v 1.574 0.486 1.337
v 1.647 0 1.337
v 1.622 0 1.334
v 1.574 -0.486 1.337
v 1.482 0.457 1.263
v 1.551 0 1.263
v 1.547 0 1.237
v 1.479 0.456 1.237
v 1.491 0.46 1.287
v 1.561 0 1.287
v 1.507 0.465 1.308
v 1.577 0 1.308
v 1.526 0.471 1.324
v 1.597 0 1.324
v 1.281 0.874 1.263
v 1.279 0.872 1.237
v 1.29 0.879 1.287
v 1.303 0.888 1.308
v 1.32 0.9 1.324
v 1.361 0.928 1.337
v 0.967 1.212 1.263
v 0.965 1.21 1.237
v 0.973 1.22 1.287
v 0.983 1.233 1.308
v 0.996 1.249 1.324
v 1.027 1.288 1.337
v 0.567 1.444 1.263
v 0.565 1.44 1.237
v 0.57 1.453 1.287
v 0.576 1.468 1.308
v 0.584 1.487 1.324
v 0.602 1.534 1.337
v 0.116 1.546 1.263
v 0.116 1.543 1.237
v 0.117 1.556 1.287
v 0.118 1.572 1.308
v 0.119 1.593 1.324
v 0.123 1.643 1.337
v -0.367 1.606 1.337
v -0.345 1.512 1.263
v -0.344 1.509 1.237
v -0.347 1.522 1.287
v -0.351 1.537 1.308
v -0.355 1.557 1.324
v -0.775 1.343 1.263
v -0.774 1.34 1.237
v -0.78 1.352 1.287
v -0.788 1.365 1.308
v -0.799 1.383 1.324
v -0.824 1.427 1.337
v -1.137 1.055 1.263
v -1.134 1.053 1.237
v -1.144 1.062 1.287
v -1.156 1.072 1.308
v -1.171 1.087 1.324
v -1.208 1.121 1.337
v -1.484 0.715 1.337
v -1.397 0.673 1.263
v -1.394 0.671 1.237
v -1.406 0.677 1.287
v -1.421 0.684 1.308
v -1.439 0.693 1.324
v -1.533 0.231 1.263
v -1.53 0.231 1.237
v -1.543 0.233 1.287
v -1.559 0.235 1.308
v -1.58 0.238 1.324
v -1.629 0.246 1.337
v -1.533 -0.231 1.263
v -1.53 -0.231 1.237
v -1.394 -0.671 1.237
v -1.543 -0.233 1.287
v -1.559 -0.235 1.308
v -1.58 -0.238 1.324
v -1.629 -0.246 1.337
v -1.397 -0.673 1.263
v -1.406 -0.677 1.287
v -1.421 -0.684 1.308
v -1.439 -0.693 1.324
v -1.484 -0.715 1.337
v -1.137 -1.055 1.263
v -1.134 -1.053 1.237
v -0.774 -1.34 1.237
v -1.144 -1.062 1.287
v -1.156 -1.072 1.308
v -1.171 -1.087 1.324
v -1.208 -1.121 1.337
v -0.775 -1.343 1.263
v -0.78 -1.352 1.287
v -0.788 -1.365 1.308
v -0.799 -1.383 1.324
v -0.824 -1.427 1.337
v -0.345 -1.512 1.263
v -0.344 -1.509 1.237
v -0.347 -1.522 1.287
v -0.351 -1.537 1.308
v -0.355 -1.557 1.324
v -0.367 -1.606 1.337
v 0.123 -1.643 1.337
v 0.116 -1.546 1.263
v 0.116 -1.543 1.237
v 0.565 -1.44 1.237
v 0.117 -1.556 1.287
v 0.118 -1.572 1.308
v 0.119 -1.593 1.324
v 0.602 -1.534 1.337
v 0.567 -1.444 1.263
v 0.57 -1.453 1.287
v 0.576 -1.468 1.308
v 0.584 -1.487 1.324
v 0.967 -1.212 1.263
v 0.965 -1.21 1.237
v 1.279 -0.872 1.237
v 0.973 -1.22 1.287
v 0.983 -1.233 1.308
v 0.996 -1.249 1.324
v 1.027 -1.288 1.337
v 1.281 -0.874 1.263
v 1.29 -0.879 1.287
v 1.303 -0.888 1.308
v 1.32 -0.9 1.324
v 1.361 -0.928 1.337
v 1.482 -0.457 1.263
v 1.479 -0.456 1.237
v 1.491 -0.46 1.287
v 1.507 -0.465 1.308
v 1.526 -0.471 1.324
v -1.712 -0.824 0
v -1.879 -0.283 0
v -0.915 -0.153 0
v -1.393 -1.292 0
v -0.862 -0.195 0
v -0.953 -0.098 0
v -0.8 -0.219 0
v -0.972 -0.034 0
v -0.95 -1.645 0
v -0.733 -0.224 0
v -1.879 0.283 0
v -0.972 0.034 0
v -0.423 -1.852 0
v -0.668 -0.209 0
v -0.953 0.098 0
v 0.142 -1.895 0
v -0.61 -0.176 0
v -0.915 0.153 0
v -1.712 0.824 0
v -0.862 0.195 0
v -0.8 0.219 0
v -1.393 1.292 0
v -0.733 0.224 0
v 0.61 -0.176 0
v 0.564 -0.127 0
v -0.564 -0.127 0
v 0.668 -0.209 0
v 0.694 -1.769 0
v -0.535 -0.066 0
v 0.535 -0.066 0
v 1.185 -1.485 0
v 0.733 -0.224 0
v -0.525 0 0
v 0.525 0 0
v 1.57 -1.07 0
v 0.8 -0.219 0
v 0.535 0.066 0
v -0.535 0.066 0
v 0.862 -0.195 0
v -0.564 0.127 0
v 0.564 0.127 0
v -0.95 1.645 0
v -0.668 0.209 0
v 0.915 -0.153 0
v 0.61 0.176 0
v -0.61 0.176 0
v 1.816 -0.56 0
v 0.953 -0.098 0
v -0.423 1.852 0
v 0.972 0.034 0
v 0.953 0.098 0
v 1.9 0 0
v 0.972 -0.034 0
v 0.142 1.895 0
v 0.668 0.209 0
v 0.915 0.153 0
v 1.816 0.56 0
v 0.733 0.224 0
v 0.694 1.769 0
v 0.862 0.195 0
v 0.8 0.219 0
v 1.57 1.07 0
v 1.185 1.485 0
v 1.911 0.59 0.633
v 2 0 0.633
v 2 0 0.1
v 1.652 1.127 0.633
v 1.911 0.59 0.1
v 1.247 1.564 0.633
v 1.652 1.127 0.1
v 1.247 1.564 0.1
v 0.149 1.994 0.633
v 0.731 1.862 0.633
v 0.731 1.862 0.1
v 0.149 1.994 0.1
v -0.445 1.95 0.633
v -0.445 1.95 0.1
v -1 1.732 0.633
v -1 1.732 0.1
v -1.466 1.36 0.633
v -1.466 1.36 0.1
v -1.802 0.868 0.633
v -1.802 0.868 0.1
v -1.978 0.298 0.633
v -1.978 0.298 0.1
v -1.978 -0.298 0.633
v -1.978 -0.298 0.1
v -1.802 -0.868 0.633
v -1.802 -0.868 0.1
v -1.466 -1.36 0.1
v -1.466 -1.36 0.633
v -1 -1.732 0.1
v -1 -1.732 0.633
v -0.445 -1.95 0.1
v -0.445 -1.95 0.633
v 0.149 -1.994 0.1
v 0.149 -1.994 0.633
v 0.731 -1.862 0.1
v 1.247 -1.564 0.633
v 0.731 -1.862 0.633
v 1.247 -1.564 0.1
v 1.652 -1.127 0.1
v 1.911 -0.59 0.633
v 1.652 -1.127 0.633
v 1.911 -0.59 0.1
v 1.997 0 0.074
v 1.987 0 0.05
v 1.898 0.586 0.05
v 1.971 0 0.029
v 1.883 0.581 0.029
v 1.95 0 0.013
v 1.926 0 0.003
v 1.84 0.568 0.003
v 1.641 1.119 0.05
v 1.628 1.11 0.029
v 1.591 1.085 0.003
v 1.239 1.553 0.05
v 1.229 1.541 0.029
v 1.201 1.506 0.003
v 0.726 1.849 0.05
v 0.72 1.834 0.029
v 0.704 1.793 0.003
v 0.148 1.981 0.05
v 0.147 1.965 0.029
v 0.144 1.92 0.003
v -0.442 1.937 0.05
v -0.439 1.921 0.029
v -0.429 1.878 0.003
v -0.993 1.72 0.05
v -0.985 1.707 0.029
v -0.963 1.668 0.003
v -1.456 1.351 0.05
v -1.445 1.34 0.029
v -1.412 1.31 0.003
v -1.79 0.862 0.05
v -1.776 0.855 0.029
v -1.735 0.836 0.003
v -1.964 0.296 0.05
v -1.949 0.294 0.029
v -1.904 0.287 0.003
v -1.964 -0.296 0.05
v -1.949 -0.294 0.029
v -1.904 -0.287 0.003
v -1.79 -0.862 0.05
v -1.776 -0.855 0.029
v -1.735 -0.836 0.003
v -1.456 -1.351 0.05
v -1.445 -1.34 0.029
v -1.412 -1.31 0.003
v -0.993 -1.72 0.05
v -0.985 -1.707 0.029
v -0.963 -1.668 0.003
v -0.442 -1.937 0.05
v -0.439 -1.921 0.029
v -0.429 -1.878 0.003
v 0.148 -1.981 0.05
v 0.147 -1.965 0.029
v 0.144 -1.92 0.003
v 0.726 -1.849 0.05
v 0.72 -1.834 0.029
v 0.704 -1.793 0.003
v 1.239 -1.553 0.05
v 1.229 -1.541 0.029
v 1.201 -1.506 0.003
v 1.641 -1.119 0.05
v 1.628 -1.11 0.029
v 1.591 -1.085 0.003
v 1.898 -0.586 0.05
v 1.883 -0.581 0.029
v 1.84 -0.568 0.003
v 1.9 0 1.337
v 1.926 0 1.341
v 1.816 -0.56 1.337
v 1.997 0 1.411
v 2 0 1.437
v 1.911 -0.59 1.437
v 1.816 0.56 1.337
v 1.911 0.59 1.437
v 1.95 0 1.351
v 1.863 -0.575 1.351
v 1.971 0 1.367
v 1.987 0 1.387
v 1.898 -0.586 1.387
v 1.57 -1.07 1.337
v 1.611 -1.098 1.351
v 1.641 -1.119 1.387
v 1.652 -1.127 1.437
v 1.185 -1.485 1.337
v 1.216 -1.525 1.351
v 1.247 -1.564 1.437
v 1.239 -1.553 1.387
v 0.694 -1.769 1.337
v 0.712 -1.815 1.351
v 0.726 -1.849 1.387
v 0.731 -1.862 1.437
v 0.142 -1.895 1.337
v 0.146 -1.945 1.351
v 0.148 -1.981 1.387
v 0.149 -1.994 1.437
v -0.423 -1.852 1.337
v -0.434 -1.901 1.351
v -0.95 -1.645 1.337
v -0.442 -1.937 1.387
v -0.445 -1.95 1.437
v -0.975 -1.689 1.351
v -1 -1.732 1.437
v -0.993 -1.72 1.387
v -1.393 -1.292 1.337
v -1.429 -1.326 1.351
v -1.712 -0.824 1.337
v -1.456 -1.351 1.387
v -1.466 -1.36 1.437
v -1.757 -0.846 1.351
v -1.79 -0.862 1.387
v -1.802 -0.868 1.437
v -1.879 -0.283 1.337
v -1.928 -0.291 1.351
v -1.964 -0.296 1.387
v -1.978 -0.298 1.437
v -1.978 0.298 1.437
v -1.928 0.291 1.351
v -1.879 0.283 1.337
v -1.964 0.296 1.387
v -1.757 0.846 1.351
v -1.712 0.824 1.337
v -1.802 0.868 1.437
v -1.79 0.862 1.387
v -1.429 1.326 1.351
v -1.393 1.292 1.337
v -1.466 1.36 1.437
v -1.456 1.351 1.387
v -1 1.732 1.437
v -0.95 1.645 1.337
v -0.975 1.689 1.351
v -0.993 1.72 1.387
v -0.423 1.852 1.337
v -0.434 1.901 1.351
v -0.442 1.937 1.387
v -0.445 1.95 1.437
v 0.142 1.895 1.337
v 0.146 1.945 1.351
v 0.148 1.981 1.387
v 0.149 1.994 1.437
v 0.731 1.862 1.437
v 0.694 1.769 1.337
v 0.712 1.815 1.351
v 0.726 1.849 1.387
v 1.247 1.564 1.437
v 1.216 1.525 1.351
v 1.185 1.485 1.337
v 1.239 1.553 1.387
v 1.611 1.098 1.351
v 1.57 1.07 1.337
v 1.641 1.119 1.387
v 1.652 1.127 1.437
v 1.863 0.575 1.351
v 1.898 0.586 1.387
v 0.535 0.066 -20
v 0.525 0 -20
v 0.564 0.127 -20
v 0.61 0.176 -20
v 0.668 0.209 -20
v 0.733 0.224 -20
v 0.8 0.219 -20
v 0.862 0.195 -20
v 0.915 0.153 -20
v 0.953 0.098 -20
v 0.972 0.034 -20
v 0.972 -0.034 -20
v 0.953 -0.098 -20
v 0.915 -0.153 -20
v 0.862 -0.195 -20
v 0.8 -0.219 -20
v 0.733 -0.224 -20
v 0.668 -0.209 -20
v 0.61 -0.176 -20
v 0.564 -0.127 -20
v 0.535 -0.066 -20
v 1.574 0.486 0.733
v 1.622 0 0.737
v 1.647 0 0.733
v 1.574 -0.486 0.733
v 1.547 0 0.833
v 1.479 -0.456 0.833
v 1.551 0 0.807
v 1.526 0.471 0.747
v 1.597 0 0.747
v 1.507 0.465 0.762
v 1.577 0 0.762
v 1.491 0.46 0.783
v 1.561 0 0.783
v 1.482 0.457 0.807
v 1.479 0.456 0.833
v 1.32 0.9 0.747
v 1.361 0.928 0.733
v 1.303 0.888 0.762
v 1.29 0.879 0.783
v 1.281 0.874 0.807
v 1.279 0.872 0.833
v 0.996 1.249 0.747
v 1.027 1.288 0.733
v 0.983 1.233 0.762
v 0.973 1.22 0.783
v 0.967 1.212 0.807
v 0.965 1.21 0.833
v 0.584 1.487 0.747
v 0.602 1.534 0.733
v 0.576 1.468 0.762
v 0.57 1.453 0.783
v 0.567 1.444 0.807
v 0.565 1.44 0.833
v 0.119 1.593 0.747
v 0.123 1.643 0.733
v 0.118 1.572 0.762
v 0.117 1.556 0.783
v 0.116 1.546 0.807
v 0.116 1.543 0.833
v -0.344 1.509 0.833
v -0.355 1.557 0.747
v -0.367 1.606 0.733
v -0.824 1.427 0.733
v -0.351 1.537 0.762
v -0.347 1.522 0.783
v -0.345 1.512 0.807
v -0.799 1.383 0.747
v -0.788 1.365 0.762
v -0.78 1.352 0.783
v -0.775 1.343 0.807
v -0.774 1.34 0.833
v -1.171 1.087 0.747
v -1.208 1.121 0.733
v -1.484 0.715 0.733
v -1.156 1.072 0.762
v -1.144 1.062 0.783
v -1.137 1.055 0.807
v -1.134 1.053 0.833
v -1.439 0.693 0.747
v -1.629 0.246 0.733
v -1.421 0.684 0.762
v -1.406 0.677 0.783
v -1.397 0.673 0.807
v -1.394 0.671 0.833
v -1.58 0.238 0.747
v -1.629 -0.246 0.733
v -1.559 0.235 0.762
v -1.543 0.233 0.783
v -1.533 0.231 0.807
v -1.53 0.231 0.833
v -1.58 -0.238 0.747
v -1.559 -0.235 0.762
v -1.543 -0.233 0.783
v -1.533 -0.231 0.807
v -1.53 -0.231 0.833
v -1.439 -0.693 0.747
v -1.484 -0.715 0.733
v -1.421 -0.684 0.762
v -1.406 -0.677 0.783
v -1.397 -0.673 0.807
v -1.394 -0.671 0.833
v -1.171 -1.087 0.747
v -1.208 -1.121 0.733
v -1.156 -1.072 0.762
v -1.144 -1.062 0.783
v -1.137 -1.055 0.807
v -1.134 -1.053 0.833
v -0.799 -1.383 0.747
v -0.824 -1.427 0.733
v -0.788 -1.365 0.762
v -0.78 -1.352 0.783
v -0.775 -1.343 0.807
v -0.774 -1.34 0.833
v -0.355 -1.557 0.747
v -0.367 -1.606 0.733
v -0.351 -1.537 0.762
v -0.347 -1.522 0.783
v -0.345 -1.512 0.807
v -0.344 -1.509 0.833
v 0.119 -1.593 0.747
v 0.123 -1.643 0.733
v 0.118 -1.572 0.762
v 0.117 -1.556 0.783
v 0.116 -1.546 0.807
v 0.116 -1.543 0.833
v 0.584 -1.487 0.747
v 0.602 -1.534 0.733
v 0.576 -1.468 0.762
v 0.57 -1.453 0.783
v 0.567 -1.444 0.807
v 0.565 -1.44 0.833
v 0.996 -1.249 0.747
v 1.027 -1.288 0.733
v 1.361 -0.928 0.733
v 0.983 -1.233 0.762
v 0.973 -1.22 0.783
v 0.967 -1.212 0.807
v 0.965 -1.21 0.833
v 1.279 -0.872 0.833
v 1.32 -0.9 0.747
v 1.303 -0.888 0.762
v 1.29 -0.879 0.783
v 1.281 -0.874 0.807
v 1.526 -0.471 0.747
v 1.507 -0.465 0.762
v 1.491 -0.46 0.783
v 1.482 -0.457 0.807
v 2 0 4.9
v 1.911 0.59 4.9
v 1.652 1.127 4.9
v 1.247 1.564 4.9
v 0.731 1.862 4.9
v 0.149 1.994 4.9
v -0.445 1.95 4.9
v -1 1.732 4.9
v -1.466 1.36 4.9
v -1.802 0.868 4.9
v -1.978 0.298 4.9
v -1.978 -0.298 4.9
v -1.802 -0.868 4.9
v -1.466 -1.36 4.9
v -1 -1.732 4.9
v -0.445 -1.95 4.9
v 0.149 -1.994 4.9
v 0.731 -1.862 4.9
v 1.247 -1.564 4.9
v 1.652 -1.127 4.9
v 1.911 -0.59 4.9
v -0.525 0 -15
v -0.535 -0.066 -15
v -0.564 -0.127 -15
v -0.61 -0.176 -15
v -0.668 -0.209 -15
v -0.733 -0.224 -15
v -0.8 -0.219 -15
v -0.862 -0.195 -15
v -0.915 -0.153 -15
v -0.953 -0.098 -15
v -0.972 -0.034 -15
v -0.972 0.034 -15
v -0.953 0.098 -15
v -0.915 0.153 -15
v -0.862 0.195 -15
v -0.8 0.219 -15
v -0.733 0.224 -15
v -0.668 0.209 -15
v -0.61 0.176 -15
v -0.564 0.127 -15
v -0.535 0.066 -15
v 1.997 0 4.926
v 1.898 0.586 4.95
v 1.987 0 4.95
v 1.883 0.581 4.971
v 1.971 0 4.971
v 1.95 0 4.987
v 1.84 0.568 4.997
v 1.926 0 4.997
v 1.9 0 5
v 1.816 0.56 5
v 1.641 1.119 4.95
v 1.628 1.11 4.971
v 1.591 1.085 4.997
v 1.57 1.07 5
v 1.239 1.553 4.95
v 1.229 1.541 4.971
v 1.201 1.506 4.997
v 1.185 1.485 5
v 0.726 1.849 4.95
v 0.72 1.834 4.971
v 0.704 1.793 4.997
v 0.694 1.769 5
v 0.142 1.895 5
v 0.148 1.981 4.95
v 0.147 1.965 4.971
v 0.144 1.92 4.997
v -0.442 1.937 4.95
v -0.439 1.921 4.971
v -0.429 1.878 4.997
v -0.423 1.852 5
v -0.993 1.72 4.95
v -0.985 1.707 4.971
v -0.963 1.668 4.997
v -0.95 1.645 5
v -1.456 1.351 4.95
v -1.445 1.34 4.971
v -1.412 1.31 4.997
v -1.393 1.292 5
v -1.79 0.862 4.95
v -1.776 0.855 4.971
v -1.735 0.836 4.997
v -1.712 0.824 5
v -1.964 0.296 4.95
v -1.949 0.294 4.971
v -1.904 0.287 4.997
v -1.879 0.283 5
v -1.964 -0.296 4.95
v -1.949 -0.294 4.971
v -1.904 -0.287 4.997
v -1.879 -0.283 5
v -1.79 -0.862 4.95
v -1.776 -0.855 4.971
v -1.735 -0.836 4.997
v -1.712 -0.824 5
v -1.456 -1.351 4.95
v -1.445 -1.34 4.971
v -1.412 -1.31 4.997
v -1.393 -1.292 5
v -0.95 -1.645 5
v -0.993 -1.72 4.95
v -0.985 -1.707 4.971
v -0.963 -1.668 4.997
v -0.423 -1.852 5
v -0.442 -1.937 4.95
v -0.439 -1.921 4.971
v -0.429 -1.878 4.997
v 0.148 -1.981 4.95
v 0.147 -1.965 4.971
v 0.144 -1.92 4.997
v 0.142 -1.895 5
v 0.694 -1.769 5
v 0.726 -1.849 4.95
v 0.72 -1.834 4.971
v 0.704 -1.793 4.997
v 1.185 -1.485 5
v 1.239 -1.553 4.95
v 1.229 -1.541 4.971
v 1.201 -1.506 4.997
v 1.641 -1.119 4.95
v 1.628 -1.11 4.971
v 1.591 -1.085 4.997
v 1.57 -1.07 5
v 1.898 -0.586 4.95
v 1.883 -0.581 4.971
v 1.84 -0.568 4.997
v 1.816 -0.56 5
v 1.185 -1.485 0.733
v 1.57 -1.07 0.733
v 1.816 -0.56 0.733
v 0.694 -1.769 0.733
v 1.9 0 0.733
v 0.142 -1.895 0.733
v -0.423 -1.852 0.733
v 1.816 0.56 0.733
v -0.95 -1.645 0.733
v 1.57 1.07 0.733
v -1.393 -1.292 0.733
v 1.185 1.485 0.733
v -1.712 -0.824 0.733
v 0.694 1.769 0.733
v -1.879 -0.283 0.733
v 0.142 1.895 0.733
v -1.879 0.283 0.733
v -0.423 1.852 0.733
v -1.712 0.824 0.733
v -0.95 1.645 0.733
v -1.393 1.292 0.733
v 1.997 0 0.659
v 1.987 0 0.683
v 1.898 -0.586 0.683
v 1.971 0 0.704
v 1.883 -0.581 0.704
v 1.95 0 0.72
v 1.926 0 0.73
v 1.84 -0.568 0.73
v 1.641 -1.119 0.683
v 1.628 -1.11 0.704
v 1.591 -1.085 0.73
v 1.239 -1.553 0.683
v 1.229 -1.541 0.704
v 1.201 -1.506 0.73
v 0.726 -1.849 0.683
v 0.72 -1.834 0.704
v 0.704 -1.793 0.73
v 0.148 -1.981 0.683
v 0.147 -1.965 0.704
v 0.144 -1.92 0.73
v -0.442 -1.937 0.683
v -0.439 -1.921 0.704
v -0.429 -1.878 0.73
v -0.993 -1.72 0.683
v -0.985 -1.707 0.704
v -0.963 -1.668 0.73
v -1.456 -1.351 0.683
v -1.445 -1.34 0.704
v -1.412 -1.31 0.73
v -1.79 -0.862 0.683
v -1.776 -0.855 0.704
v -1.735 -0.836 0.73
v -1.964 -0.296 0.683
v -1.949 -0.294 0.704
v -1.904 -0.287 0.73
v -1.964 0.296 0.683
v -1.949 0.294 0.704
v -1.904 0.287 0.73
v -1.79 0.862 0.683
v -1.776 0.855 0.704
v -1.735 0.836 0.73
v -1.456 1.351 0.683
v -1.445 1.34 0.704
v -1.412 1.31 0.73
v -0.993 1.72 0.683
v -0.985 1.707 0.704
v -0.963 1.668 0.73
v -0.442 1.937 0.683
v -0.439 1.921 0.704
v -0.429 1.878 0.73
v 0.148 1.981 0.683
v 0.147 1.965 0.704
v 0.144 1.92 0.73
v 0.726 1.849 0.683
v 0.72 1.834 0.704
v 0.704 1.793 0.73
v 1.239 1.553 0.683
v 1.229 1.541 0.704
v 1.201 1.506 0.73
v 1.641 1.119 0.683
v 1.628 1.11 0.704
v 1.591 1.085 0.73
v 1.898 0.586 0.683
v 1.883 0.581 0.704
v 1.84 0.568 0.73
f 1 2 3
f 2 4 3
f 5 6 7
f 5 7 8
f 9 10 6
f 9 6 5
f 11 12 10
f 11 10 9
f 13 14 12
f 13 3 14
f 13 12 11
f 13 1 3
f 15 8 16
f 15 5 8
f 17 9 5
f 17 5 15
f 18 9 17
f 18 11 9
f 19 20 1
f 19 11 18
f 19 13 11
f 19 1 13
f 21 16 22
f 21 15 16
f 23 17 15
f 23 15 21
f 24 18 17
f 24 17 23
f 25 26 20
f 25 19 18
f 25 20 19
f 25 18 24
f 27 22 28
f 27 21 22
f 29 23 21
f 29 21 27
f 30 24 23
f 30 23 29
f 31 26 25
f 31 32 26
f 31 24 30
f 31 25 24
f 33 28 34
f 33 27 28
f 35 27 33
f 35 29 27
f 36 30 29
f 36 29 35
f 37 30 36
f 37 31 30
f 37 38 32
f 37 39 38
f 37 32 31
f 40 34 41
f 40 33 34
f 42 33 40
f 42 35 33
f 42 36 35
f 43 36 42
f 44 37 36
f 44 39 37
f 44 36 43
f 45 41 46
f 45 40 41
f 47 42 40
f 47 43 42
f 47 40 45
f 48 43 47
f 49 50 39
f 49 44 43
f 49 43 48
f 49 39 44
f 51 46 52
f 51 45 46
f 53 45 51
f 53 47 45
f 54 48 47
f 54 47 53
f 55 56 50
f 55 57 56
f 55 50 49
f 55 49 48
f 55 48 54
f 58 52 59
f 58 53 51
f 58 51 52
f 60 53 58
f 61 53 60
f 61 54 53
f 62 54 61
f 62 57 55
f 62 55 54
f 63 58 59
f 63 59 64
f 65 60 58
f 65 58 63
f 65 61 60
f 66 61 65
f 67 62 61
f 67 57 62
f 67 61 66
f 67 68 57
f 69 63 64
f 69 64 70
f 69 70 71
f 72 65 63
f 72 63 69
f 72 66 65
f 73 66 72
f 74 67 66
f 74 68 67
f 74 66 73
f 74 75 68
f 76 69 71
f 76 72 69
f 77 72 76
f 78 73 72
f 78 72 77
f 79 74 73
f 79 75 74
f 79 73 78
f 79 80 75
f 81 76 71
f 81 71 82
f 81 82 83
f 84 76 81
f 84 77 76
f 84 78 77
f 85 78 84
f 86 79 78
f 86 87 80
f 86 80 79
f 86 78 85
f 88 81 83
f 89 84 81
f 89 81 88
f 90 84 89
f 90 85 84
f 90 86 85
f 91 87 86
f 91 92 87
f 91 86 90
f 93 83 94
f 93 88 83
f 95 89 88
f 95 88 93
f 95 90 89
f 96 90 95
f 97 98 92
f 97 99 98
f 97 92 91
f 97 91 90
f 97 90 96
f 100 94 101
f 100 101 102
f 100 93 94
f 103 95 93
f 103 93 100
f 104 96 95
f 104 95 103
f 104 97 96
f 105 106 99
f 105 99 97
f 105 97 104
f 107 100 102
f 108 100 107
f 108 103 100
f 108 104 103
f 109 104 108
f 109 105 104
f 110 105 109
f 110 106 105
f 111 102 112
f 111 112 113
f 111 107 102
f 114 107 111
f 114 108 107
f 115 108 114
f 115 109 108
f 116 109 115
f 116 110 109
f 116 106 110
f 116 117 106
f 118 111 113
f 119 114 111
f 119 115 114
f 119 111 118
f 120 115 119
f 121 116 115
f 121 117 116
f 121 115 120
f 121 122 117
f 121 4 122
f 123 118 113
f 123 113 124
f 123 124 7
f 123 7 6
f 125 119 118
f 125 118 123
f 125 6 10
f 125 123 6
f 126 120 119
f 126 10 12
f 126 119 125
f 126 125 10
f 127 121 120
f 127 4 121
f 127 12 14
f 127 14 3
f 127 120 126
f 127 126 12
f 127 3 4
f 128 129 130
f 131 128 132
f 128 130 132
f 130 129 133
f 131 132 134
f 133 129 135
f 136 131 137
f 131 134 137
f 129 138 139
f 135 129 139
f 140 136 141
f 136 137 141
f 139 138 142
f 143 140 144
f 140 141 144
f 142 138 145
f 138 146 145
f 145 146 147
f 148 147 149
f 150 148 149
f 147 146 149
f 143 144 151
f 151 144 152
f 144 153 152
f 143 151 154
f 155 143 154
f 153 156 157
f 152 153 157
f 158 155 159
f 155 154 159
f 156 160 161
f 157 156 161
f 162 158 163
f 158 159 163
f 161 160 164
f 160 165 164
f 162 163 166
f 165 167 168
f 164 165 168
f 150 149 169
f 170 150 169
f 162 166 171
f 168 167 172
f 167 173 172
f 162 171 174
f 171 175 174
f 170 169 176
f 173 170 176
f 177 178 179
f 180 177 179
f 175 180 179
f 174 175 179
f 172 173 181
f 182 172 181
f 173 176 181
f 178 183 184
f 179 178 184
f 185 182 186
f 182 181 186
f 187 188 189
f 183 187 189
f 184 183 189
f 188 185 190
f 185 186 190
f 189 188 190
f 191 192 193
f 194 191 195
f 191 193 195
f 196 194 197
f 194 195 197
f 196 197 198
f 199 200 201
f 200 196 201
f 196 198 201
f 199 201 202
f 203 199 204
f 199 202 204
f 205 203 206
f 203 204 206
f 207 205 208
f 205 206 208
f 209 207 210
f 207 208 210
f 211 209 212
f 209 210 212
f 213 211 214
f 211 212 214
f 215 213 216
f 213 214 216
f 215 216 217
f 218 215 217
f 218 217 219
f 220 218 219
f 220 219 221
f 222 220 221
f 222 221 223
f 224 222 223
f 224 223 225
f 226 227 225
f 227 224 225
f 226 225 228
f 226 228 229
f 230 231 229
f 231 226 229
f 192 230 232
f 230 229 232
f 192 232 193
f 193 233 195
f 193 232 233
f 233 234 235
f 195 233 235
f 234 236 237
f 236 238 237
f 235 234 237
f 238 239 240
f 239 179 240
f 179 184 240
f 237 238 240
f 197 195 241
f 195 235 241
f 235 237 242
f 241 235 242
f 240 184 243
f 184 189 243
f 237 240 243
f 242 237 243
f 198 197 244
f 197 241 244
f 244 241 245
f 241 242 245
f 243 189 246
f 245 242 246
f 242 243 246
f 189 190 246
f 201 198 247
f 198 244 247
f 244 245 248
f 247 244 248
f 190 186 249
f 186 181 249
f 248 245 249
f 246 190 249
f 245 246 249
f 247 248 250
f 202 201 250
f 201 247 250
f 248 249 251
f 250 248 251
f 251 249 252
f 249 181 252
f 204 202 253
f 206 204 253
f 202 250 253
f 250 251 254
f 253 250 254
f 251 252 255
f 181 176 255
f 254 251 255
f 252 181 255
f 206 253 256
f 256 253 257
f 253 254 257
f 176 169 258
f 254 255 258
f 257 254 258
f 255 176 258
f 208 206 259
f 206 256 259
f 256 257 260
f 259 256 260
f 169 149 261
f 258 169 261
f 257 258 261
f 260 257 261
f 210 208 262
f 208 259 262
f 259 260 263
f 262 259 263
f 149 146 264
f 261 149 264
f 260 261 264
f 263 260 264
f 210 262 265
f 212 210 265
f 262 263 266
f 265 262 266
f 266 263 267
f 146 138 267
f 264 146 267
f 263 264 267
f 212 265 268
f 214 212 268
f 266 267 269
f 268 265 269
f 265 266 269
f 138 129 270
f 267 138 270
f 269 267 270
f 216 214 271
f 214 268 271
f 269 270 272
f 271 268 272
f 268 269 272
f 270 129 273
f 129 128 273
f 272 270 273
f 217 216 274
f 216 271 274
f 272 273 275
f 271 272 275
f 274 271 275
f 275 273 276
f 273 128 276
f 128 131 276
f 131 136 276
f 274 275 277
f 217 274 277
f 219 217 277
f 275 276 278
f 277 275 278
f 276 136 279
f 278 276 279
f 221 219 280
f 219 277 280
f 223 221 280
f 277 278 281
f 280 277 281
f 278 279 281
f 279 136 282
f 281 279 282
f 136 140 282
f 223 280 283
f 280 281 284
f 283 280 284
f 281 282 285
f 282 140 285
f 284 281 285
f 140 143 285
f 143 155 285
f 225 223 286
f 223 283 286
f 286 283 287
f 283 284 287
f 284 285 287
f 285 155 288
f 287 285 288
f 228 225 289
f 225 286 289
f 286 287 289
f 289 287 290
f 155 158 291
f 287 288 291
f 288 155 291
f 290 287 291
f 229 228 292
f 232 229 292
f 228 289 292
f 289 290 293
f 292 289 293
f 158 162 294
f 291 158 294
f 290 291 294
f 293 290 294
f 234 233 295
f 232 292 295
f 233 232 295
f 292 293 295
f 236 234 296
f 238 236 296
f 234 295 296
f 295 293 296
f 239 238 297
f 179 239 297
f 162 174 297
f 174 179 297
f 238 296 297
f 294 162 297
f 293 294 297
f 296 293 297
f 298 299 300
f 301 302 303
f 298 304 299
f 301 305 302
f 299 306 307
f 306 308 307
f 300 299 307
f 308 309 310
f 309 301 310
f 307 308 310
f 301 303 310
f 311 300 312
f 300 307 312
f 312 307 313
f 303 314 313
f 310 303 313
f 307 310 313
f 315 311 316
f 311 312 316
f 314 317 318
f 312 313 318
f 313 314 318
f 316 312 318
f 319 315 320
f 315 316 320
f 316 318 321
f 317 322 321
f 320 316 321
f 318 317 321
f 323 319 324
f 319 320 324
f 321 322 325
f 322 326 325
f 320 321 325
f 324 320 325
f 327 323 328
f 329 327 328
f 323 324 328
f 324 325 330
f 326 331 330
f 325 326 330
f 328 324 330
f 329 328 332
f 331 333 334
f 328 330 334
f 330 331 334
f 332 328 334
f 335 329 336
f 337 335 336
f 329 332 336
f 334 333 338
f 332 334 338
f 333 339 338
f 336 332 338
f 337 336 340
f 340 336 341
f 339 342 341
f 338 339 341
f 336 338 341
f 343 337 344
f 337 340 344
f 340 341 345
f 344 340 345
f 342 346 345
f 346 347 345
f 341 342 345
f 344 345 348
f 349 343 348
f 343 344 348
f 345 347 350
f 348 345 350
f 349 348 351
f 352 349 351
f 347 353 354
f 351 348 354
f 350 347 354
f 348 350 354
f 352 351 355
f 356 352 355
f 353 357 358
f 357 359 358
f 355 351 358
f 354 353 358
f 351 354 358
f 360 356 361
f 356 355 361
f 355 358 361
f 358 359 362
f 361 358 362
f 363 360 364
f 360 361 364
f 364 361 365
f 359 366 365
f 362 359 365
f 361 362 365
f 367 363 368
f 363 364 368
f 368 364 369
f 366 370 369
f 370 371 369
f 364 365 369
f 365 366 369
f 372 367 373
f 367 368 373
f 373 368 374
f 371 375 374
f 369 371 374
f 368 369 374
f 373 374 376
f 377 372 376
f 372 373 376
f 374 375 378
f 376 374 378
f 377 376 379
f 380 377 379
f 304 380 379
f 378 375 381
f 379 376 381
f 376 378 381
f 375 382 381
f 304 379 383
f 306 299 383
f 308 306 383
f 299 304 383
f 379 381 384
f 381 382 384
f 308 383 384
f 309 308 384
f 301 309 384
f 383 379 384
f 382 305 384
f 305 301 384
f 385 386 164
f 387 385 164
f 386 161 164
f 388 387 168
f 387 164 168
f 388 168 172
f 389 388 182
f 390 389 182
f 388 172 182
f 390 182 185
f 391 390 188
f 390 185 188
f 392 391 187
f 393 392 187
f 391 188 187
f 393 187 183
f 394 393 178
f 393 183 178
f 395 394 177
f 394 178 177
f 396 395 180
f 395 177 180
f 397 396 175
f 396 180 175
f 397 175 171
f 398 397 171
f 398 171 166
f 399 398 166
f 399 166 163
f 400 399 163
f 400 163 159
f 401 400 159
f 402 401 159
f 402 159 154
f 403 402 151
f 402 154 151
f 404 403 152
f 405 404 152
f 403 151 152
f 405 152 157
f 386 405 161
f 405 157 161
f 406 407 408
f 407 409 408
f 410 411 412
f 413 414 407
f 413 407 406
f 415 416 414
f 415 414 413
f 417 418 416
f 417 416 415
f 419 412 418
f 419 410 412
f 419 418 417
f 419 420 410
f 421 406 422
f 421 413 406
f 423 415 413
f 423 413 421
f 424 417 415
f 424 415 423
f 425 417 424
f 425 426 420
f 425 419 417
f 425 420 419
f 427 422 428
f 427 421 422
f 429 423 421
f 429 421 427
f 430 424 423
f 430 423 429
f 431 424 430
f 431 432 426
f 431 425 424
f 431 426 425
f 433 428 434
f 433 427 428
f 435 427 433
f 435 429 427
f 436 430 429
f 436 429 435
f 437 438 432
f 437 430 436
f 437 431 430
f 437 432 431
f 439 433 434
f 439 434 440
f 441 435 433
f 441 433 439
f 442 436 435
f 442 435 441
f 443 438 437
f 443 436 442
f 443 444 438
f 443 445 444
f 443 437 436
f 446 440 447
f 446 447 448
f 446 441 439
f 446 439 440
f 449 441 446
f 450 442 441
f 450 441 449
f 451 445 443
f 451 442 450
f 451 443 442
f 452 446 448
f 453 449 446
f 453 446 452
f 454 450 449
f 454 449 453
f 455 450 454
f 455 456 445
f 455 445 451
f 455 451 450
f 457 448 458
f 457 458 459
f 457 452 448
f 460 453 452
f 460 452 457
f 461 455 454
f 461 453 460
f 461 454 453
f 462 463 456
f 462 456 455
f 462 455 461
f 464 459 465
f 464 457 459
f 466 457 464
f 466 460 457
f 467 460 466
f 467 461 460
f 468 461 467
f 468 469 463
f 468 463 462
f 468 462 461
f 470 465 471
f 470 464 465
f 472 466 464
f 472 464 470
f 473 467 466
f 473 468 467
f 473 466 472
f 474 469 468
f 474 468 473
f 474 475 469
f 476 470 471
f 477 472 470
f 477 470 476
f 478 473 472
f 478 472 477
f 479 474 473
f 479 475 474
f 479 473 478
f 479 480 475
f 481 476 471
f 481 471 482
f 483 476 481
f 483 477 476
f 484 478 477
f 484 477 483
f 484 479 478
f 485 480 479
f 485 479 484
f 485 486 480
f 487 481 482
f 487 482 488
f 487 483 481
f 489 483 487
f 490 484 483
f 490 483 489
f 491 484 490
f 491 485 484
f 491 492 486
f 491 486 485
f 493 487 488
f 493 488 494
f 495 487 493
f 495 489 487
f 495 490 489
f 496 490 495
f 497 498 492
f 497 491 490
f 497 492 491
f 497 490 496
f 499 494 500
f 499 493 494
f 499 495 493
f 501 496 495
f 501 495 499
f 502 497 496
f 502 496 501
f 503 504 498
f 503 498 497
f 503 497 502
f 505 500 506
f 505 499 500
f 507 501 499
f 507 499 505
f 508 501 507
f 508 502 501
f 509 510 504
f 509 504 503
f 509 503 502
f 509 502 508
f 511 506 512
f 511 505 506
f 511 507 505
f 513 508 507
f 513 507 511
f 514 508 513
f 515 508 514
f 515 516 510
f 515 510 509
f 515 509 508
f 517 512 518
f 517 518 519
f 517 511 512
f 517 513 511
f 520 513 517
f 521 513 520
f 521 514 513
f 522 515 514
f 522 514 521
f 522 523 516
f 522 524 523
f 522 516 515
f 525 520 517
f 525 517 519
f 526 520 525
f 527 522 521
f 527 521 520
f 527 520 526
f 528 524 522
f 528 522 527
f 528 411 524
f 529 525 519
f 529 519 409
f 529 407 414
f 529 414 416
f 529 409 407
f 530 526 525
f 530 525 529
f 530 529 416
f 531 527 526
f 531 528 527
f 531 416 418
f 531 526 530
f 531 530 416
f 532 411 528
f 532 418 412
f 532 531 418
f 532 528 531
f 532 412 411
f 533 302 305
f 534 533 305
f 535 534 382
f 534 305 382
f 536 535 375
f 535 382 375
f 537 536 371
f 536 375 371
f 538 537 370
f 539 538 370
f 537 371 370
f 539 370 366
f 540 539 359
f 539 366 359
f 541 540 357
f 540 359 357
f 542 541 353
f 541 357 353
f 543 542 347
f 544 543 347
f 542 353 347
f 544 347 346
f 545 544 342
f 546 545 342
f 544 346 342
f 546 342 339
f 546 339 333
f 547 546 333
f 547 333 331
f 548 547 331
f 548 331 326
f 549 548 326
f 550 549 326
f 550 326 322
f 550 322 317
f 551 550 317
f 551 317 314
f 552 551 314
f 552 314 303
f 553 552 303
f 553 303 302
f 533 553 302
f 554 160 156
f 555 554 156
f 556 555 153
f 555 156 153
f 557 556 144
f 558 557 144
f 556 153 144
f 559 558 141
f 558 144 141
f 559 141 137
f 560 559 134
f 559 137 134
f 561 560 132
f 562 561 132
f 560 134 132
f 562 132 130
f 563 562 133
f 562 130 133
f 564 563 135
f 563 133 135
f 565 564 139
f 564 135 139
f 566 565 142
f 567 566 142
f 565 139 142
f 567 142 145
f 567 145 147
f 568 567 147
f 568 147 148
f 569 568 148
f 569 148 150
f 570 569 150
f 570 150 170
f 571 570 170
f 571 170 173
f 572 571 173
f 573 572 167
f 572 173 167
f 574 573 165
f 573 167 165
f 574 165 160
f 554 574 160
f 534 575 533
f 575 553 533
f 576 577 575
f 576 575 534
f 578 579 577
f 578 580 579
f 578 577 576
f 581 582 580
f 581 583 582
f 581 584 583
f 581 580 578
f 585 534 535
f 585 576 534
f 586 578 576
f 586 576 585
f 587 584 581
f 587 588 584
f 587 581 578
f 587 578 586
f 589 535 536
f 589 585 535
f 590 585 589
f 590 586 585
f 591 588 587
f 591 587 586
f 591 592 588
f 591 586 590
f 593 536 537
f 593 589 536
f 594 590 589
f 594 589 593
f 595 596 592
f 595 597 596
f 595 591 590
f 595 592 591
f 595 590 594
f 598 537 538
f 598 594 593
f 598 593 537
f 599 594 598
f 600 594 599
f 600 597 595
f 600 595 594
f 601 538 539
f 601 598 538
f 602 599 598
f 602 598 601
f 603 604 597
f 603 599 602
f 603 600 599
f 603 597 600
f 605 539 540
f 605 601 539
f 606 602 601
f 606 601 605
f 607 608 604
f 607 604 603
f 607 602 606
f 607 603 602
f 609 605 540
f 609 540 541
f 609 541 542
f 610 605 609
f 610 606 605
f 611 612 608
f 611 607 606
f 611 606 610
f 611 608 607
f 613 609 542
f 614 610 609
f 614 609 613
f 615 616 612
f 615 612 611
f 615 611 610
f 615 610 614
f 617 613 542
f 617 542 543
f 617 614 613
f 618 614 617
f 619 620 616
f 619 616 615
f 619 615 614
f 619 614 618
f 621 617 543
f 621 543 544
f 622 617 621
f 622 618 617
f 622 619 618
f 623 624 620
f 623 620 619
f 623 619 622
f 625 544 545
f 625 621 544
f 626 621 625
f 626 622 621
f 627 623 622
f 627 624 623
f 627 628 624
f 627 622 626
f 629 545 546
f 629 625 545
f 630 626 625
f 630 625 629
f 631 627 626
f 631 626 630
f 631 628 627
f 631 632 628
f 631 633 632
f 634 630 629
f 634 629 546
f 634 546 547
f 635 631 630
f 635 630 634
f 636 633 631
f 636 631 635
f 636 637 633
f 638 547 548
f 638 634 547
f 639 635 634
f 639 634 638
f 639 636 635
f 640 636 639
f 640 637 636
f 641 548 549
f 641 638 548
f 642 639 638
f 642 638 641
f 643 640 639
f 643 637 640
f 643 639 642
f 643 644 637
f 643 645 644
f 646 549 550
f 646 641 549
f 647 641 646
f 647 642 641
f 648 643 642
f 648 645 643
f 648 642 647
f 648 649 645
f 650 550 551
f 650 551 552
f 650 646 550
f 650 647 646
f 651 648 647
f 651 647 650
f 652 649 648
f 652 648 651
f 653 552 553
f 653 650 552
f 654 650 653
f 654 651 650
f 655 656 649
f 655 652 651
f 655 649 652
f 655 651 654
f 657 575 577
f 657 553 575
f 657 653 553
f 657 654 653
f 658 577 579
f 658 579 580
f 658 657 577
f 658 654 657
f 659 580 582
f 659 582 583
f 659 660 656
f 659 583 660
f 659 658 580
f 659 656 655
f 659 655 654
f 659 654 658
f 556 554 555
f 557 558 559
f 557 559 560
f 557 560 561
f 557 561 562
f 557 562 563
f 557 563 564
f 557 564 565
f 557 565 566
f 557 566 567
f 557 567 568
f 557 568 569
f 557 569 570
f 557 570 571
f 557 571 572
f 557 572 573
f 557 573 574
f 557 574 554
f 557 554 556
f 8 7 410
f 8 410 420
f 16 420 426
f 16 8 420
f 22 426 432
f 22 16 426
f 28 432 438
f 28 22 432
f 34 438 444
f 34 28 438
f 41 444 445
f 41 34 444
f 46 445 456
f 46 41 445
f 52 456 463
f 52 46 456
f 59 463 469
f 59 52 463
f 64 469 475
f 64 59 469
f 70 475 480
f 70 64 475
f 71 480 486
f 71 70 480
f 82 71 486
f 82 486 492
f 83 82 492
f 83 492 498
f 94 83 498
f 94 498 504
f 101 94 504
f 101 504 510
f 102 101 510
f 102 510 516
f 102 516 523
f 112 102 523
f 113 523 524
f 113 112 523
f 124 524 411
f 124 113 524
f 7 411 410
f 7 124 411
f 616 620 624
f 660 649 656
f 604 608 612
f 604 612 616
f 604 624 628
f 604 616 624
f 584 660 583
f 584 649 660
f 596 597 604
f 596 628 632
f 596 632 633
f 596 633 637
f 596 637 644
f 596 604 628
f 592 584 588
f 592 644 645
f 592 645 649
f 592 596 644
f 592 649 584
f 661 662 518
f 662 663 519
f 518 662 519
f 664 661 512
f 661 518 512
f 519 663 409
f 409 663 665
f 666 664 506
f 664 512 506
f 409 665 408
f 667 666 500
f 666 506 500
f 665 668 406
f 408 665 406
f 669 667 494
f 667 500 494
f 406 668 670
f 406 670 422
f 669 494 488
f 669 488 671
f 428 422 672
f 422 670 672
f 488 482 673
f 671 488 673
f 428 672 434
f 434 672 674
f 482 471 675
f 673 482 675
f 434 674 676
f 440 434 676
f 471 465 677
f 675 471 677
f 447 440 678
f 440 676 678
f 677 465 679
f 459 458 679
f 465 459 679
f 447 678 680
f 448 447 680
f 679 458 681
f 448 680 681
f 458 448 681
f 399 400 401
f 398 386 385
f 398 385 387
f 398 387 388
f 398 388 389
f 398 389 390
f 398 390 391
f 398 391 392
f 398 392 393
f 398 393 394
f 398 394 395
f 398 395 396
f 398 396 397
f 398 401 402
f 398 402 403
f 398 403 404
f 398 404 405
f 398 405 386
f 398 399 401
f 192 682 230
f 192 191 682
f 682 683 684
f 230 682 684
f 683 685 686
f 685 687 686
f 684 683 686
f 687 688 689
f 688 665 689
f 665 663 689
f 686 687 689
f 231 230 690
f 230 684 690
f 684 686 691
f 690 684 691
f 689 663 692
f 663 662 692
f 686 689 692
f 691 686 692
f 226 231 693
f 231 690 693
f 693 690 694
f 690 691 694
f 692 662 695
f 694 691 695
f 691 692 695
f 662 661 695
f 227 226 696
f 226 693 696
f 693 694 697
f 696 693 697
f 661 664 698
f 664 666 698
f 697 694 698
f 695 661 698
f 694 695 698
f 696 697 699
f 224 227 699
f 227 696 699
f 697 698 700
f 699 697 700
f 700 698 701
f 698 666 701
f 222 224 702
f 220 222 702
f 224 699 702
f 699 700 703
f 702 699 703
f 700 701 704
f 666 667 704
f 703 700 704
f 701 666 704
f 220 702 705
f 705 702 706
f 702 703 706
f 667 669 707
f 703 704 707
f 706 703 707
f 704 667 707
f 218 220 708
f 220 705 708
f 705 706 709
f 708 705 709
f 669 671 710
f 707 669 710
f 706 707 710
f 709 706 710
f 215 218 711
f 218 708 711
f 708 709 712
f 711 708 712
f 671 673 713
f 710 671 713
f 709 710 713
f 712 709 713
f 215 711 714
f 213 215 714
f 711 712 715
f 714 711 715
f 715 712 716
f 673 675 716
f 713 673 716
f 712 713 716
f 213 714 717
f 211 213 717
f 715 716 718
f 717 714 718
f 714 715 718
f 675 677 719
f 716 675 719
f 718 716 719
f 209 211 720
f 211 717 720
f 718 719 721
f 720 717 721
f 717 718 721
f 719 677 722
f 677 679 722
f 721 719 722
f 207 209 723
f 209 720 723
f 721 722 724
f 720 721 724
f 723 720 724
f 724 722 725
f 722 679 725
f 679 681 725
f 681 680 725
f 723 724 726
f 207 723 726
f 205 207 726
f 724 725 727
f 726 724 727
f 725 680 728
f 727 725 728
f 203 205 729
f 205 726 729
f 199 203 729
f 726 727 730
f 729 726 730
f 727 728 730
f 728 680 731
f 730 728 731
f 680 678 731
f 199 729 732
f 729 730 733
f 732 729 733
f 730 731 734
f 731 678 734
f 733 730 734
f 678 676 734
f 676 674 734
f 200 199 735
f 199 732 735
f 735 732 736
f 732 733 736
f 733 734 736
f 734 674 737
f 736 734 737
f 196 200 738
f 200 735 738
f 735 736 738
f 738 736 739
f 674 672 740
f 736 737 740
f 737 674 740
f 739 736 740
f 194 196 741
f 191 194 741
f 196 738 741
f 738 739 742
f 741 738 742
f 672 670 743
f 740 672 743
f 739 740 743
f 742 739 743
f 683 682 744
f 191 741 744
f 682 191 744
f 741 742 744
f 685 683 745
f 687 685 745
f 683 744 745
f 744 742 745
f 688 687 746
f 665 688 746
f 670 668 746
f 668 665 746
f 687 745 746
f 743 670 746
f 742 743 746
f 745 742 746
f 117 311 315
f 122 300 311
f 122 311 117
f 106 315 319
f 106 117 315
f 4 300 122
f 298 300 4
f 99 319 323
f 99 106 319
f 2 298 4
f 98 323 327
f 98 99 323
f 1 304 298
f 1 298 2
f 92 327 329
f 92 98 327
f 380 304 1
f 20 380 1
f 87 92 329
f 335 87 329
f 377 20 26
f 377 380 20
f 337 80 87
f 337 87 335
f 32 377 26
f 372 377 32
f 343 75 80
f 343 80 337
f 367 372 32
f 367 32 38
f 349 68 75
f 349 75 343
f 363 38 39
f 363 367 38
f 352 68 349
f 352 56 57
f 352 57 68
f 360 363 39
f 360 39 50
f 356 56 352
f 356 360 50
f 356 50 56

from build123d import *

# Parameters (mm, degrees)
F0_R     = 2
F1_DEPTH = 5
F2_W     = 1.057303627
F2_H     = 0.604173576
F4_R     = 0.1
F5_R     = 0.225
F6_DEPTH = 15
F7_DEPTH = 5


with BuildPart() as f1:
    # F0 (on Top) → F1 (new body)
    with BuildSketch(Plane.XY):
        Circle(F0_R)
    extrude(amount=F1_DEPTH)

    # F2 (on Front) → F3 (revolve, cut)
    with BuildSketch(Plane.XZ):
        with Locations((2.0760625484, 1.0352871905)):
            Rectangle(F2_W, F2_H)
    revolve(axis=Axis((0, 0, 0), (0, 0, 1)), mode=Mode.SUBTRACT)

    # F4
    f4_edges = [f1.edges().sort_by_distance(p)[0] for p in [
        (-2, 0, 1.337374),
        (-1.547411, 0, 1.337374),
        (-1.547411, 0, 0.7332),
        (-2, 0, 0.7332),
        (-2, 0, 5),
        (-2, 0, 0),
    ]]
    fillet(f4_edges, radius=F4_R)

    # F5 (on face) → F6 (join)
    with BuildSketch(Plane(origin=(0, 0, 0), x_dir=(1, 0, 0), z_dir=(0, 0, -1))):
        with Locations((-0.75, 0)):
            Circle(F5_R)
        with BuildLine():
            ThreePointArc((0.975, 0), (0.75, 0.225), (0.525, 0))
            ThreePointArc((0.525, 0), (0.75, -0.225), (0.975, 0))
        make_face()
    extrude(amount=F6_DEPTH)

    # F7 (add): a face of the model
    f7_faces = [f1.faces().sort_by_distance(p)[0] for p in [
        (0.75, 0, -15),
    ]]
    extrude(f7_faces, amount=F7_DEPTH)


solid = f1.part
